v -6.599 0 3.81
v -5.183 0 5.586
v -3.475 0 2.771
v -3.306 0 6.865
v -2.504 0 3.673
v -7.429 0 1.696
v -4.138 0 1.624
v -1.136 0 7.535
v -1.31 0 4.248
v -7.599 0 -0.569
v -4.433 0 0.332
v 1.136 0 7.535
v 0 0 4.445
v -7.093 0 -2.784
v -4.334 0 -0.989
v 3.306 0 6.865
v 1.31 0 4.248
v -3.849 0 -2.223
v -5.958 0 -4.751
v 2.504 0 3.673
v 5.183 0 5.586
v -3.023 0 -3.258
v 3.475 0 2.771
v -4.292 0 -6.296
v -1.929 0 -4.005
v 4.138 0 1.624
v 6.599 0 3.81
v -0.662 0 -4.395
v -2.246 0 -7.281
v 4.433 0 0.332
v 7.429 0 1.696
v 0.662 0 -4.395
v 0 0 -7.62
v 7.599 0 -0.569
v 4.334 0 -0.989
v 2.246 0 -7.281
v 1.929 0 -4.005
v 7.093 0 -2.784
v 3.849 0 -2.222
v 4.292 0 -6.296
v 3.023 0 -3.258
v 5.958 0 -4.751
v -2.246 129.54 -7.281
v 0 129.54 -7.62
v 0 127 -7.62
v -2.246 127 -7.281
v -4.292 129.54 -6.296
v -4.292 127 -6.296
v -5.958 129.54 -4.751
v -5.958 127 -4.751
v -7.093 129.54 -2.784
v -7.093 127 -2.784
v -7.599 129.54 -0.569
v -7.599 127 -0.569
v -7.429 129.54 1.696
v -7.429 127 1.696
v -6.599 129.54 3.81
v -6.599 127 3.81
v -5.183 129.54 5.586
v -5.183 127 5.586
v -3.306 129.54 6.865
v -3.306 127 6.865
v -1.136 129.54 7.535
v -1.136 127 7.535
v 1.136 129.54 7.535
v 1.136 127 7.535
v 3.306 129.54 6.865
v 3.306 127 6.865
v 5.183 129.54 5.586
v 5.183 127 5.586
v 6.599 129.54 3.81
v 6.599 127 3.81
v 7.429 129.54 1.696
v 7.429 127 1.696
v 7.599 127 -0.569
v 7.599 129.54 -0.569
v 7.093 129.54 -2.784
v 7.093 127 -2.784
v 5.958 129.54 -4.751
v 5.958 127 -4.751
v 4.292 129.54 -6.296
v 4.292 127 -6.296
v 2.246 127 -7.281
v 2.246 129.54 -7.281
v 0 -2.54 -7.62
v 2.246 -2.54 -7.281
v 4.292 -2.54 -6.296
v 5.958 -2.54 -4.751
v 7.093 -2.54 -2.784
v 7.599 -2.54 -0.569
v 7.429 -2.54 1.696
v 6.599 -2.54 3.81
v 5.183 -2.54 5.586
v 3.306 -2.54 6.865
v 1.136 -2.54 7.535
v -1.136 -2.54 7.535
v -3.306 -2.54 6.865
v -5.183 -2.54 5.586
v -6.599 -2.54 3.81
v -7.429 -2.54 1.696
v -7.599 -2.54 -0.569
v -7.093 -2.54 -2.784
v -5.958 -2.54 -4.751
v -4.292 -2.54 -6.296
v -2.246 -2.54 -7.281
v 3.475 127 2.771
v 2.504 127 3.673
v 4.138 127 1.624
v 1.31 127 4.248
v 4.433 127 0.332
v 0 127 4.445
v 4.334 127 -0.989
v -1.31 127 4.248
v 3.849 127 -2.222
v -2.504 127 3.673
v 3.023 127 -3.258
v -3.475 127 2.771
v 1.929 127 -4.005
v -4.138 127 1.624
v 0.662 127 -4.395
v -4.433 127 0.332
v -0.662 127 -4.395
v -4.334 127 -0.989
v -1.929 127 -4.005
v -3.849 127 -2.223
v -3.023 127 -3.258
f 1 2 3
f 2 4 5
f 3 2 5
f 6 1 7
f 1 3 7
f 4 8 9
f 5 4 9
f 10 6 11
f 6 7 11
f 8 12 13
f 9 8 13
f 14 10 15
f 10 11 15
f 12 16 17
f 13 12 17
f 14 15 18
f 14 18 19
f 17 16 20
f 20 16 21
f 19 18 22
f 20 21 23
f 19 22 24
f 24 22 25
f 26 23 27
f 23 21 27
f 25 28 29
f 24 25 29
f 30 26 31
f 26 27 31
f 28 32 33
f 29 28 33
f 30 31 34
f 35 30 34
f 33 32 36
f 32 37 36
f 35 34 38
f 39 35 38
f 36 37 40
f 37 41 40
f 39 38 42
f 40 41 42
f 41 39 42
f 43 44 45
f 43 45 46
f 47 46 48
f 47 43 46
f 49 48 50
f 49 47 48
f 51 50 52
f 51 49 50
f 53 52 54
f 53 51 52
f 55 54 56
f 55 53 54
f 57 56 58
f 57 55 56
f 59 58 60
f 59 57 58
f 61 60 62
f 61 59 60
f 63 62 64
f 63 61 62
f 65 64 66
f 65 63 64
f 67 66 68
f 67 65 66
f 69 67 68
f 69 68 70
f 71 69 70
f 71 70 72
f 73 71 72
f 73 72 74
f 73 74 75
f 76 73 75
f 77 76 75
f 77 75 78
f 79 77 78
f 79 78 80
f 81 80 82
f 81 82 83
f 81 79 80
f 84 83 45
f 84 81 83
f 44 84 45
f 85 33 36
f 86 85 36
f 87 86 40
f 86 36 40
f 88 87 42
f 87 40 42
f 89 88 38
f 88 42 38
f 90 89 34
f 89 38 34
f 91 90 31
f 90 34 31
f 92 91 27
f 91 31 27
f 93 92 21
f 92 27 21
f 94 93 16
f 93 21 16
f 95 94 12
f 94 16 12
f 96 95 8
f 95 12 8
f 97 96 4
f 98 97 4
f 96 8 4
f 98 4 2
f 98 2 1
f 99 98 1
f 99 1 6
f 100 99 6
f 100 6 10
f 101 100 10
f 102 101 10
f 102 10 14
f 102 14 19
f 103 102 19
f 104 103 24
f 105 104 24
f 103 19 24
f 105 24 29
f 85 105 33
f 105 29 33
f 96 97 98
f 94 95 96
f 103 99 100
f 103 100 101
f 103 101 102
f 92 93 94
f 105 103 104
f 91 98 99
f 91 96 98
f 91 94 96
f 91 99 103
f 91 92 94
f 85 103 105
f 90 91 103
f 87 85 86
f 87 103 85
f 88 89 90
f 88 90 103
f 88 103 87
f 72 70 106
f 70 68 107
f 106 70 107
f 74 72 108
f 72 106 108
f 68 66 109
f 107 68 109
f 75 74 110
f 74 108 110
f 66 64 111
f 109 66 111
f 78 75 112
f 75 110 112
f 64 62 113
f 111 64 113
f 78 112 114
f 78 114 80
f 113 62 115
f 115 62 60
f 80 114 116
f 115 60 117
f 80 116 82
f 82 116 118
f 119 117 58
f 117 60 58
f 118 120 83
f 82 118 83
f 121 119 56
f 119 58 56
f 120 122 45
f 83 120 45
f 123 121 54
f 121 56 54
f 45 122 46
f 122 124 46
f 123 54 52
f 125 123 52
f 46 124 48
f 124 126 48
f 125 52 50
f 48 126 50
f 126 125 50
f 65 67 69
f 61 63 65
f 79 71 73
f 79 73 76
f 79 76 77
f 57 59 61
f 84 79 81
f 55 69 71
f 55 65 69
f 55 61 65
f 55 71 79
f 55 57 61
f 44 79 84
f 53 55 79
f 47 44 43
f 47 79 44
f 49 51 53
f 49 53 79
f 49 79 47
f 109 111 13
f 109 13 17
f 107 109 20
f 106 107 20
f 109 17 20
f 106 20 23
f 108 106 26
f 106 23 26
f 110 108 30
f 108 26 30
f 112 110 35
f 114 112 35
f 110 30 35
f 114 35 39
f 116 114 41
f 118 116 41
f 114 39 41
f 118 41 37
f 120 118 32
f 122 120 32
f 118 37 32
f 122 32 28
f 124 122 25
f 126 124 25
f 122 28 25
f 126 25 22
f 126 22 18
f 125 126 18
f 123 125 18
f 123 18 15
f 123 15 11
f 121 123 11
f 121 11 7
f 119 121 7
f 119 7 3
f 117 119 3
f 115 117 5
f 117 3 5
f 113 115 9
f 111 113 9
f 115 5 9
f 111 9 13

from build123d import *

# Parameters (mm, degrees)
SKETCH1_R           = 4.445
BOSS_EXTRUDE1_DEPTH = 127
SKETCH2_R           = 7.62
BOSS_EXTRUDE2_DEPTH = 2.54
BOSS_EXTRUDE3_START = 2.54
SKETCH3_R           = 7.62
BOSS_EXTRUDE3_DEPTH = 2.54


with BuildPart() as part:
    # Sketch1 → Boss-Extrude1 (new body)
    with BuildSketch(Plane(origin=(0, 0, 0), x_dir=(1, 0, 0), z_dir=(0, 1, 0))):
        with Locations(Location((0, 0, 0), (0, 0, 270))):
            Circle(SKETCH1_R)
    extrude(amount=BOSS_EXTRUDE1_DEPTH)

    # Sketch2 → Boss-Extrude2 (add)
    with BuildSketch(Plane.XZ):
        with Locations(Location((0, 0, 0), (0, 0, 270))):
            Circle(SKETCH2_R)
    extrude(amount=BOSS_EXTRUDE2_DEPTH)

    # Sketch3 → Boss-Extrude3 (add)
    with BuildSketch(Plane(origin=(0, 127, 0), x_dir=(1, 0, 0), z_dir=(0, 1, 0)).offset(BOSS_EXTRUDE3_START)):
        with Locations(Location((0, 0, 0), (0, 0, 90))):
            Circle(SKETCH3_R)
    extrude(amount=-BOSS_EXTRUDE3_DEPTH)


solid = part.part
